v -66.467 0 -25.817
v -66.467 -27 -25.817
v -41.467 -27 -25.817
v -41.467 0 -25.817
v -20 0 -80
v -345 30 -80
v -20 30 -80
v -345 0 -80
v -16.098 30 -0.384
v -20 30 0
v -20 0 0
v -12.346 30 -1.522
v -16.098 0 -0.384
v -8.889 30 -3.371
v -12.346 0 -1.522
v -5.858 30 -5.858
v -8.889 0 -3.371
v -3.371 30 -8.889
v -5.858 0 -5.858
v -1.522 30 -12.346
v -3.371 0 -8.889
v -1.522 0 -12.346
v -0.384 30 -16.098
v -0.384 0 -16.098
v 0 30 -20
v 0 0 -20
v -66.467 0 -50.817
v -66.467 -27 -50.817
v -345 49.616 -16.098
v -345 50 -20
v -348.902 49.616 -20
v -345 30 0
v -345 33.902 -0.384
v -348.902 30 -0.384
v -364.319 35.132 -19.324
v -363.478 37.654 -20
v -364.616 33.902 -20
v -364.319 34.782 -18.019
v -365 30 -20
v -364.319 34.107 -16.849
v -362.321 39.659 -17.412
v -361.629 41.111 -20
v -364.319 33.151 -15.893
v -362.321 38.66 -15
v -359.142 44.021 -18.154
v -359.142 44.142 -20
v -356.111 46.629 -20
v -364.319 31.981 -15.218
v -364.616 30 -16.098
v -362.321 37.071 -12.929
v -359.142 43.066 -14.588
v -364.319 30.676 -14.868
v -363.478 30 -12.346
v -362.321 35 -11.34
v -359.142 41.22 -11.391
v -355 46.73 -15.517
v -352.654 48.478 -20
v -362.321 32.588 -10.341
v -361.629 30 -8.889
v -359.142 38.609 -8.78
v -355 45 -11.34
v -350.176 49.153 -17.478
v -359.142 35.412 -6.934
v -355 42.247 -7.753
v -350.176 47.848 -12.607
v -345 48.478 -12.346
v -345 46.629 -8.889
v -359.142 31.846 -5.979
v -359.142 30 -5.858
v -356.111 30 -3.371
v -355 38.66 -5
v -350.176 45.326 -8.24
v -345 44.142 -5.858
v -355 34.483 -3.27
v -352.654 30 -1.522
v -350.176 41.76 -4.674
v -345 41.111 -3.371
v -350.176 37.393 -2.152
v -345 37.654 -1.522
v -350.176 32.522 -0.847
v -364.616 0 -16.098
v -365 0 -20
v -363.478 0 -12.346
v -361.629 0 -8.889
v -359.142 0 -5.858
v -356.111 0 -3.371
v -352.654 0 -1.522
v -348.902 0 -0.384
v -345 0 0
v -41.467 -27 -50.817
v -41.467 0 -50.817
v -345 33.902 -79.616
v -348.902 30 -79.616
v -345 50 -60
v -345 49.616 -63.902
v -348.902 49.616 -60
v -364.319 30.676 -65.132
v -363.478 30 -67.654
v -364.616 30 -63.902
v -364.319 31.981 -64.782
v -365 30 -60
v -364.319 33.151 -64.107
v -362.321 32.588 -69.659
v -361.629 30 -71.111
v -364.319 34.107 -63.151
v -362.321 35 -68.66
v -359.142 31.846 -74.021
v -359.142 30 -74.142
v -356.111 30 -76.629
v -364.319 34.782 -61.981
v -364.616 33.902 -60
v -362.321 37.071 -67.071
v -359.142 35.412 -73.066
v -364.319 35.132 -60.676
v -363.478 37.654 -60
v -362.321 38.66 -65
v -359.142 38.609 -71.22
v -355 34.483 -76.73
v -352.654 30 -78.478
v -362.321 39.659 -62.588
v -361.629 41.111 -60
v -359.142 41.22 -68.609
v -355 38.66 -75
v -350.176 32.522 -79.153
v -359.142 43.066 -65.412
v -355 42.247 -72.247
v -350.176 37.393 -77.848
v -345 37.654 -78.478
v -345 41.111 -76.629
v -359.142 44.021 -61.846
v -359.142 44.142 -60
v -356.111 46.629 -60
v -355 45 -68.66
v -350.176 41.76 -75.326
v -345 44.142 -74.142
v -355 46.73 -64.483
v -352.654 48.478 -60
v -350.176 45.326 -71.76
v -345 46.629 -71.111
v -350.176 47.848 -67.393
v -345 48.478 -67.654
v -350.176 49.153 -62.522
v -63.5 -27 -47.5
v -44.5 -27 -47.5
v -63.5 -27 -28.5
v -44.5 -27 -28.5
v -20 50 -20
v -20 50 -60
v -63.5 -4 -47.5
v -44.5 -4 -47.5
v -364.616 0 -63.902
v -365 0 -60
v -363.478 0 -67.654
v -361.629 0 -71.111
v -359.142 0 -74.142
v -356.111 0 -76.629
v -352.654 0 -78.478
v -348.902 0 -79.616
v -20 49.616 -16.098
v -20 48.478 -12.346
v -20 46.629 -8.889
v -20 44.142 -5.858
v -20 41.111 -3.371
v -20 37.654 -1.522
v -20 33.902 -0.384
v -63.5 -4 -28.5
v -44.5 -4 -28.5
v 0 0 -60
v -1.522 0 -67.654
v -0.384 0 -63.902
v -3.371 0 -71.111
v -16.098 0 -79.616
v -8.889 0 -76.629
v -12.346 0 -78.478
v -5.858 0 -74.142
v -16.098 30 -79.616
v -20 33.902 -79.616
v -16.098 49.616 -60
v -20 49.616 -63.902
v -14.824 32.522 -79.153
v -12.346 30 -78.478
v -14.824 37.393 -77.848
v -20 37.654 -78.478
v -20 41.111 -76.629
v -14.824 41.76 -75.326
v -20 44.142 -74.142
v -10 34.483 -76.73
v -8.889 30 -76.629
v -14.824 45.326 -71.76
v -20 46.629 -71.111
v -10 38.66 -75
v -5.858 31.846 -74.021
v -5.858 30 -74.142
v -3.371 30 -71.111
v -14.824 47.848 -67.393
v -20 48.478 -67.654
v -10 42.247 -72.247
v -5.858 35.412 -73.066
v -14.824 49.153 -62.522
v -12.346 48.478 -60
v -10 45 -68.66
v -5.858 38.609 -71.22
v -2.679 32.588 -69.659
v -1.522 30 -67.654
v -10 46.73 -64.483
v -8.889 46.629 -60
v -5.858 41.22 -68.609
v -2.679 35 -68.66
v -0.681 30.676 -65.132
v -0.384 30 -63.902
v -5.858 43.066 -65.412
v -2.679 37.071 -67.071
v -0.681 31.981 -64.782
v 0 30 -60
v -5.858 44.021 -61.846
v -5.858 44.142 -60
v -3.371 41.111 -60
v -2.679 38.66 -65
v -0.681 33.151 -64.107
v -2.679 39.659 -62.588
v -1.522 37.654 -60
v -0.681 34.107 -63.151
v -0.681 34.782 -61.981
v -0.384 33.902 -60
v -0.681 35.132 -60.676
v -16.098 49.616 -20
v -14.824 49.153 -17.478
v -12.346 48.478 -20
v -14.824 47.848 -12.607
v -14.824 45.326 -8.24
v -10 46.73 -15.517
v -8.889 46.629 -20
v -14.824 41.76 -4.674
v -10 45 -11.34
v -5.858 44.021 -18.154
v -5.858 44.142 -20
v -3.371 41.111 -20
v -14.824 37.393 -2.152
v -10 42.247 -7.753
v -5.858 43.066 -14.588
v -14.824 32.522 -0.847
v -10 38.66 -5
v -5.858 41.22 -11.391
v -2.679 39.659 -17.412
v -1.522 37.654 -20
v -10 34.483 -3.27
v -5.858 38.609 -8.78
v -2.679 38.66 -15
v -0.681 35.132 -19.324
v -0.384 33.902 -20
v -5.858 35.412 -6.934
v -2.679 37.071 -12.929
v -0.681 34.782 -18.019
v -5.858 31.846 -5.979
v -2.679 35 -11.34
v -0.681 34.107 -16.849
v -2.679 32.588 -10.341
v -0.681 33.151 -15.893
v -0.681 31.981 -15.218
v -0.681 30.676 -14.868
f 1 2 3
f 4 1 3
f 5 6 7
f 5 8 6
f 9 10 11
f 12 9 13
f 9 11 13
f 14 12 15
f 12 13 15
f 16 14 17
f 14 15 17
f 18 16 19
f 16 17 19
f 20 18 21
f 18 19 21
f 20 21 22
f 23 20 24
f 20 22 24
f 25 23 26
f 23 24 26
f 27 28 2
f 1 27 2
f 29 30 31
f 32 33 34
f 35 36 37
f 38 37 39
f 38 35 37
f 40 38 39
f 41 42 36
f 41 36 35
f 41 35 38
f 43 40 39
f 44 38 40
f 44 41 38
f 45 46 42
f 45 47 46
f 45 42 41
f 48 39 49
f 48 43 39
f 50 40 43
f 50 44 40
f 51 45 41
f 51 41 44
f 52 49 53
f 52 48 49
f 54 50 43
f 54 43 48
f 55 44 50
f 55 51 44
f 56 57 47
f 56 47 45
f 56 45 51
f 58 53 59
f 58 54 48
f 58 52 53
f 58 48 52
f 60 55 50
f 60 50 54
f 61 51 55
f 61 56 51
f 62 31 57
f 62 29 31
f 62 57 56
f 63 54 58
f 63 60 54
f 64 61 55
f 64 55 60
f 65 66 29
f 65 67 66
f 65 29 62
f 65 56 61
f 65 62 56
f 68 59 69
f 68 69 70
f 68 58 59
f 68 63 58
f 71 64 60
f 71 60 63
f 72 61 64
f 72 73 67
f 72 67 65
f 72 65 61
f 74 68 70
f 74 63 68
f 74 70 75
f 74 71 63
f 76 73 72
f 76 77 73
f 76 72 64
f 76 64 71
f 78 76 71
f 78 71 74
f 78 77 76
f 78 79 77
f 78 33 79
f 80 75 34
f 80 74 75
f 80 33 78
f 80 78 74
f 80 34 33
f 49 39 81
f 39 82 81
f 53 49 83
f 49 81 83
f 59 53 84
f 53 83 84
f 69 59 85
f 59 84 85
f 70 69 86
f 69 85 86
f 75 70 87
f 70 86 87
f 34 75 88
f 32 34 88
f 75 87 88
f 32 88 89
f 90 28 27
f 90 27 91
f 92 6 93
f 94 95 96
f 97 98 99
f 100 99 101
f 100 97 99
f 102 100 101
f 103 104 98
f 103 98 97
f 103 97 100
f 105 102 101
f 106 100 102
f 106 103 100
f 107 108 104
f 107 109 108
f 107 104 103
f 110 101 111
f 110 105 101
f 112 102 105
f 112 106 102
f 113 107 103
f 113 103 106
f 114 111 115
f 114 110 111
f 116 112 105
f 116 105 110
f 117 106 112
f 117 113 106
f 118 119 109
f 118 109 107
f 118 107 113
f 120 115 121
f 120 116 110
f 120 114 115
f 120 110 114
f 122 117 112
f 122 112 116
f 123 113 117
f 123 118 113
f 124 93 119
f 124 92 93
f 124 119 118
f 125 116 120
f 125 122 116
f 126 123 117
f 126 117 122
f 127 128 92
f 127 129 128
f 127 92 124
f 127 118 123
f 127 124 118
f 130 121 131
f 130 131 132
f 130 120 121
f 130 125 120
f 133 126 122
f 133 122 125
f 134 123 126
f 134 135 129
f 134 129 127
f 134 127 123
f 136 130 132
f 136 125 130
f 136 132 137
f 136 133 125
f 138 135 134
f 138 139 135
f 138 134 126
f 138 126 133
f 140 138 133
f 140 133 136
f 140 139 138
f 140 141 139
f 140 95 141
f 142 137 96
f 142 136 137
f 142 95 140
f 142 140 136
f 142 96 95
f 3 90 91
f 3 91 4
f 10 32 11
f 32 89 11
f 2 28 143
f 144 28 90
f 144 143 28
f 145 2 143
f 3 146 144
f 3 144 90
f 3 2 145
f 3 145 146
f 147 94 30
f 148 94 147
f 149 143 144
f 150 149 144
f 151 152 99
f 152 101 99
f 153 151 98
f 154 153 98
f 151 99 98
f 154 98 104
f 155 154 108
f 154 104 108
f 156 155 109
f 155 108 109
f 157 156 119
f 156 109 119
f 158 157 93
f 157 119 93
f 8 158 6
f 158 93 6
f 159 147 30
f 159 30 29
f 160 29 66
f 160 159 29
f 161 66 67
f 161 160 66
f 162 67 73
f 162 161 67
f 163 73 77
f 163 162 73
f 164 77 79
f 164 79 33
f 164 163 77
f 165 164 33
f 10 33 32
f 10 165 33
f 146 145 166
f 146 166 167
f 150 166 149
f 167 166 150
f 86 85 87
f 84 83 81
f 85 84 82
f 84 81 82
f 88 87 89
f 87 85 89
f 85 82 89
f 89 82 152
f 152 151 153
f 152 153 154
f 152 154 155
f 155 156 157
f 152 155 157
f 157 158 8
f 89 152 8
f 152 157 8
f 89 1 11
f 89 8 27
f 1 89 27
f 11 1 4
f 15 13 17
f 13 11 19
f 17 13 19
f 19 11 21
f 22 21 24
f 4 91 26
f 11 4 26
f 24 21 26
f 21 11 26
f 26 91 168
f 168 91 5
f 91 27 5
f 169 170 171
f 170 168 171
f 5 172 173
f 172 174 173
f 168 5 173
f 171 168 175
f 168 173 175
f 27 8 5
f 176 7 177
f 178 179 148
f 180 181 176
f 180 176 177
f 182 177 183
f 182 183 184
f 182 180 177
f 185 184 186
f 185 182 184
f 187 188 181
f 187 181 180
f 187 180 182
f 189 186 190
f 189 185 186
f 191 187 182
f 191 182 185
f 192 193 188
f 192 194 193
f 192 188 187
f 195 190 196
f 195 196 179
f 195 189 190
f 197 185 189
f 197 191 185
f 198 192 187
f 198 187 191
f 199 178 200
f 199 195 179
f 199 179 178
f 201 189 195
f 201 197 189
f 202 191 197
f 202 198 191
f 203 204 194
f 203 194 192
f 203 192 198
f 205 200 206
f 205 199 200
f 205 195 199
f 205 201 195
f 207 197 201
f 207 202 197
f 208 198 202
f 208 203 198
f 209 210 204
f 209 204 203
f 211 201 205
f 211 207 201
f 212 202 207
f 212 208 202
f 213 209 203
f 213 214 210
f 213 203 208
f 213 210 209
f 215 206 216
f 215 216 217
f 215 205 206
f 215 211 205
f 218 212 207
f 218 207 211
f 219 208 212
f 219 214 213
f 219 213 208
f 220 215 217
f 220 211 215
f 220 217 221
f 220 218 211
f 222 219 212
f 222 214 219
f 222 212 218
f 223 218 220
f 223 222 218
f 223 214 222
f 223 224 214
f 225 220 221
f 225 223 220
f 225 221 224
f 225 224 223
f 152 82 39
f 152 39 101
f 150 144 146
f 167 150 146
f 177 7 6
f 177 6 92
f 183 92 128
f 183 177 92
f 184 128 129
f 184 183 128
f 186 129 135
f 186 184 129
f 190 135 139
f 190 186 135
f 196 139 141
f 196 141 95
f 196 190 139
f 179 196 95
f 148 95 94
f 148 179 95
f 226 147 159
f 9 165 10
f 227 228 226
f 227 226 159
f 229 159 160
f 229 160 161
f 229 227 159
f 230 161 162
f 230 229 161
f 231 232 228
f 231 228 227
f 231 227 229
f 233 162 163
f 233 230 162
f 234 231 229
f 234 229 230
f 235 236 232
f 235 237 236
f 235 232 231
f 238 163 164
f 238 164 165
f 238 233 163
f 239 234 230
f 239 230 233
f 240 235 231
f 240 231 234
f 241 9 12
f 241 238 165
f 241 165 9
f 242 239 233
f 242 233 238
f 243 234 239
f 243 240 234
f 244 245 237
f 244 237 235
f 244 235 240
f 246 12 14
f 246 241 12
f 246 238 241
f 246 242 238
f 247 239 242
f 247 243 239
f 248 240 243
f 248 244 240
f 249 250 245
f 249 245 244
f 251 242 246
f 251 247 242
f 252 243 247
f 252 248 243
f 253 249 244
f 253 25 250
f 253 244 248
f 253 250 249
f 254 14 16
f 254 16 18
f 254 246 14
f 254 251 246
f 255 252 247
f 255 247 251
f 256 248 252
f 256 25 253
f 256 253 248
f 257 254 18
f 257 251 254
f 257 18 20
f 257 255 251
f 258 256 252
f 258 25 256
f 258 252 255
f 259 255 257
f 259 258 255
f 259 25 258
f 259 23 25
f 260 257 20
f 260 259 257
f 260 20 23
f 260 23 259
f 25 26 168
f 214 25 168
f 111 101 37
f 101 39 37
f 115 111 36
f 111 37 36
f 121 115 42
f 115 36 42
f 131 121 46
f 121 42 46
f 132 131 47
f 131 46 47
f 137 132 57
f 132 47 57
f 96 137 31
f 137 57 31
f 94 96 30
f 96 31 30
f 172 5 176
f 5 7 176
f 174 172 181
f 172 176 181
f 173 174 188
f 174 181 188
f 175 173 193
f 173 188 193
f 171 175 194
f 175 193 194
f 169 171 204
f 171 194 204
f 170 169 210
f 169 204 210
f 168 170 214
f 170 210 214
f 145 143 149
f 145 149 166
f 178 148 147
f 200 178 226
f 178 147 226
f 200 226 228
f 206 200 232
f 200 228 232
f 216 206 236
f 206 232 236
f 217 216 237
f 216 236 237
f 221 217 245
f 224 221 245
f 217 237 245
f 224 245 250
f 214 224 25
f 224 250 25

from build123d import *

# Parameters (mm, degrees)
CROQUIS1_W              = 365
CROQUIS1_H              = 80
SALIENTE_EXTRUIR1_DEPTH = 50
REDONDEO1_R             = 20
REDONDEO2_R             = 20
REDONDEO3_R             = 20
REDONDEO4_R             = 20
CROQUIS2_W              = 25
CROQUIS2_H              = 25
SALIENTE_EXTRUIR2_DEPTH = 27
CROQUIS3_W              = 19
CROQUIS3_H              = 19
CORTAR_EXTRUIR1_DEPTH   = 23


with BuildPart() as part:
    # Croquis1 → Saliente-Extruir1 (new body)
    with BuildSketch(Plane(origin=(0, 0, 0), x_dir=(1, 0, 0), z_dir=(0, 1, 0))):
        with Locations((-182.5, 40)):
            Rectangle(CROQUIS1_W, CROQUIS1_H)
    extrude(amount=SALIENTE_EXTRUIR1_DEPTH)

    # Redondeo1
    redondeo1_edges = [part.edges().sort_by_distance(p)[0] for p in [
        (-182.5, 50, -80),
    ]]
    fillet(redondeo1_edges, radius=REDONDEO1_R)

    # Redondeo2
    redondeo2_edges = [part.edges().sort_by_distance(p)[0] for p in [
        (-182.5, 50, 0),
    ]]
    fillet(redondeo2_edges, radius=REDONDEO2_R)

    # Redondeo3
    redondeo3_edges = [part.edges().sort_by_distance(p)[0] for p in [
        (0, 15, -80),
        (0, 44.142135624, -74.142135624),
        (0, 15, 0),
        (0, 50, -40),
        (0, 44.142135624, -5.857864376),
    ]]
    fillet(redondeo3_edges, radius=REDONDEO3_R)

    # Redondeo4
    redondeo4_edges = [part.edges().sort_by_distance(p)[0] for p in [
        (-365, 15, -80),
        (-365, 44.142135624, -74.142135624),
        (-365, 15, 0),
        (-365, 50, -40),
        (-365, 44.142135624, -5.857864376),
    ]]
    fillet(redondeo4_edges, radius=REDONDEO4_R)

    # Croquis2 → Saliente-Extruir2 (add)
    with BuildSketch(Plane.XZ):
        with Locations((-53.967193185, -38.316617584)):
            Rectangle(CROQUIS2_W, CROQUIS2_H)
    extrude(amount=SALIENTE_EXTRUIR2_DEPTH)

    # Croquis3 → Cortar-Extruir1 (cut)
    with BuildSketch(Plane.XZ.offset(27)):
        with Locations((-54, -38)):
            Rectangle(CROQUIS3_W, CROQUIS3_H)
    extrude(amount=-CORTAR_EXTRUIR1_DEPTH, mode=Mode.SUBTRACT)


solid = part.part
